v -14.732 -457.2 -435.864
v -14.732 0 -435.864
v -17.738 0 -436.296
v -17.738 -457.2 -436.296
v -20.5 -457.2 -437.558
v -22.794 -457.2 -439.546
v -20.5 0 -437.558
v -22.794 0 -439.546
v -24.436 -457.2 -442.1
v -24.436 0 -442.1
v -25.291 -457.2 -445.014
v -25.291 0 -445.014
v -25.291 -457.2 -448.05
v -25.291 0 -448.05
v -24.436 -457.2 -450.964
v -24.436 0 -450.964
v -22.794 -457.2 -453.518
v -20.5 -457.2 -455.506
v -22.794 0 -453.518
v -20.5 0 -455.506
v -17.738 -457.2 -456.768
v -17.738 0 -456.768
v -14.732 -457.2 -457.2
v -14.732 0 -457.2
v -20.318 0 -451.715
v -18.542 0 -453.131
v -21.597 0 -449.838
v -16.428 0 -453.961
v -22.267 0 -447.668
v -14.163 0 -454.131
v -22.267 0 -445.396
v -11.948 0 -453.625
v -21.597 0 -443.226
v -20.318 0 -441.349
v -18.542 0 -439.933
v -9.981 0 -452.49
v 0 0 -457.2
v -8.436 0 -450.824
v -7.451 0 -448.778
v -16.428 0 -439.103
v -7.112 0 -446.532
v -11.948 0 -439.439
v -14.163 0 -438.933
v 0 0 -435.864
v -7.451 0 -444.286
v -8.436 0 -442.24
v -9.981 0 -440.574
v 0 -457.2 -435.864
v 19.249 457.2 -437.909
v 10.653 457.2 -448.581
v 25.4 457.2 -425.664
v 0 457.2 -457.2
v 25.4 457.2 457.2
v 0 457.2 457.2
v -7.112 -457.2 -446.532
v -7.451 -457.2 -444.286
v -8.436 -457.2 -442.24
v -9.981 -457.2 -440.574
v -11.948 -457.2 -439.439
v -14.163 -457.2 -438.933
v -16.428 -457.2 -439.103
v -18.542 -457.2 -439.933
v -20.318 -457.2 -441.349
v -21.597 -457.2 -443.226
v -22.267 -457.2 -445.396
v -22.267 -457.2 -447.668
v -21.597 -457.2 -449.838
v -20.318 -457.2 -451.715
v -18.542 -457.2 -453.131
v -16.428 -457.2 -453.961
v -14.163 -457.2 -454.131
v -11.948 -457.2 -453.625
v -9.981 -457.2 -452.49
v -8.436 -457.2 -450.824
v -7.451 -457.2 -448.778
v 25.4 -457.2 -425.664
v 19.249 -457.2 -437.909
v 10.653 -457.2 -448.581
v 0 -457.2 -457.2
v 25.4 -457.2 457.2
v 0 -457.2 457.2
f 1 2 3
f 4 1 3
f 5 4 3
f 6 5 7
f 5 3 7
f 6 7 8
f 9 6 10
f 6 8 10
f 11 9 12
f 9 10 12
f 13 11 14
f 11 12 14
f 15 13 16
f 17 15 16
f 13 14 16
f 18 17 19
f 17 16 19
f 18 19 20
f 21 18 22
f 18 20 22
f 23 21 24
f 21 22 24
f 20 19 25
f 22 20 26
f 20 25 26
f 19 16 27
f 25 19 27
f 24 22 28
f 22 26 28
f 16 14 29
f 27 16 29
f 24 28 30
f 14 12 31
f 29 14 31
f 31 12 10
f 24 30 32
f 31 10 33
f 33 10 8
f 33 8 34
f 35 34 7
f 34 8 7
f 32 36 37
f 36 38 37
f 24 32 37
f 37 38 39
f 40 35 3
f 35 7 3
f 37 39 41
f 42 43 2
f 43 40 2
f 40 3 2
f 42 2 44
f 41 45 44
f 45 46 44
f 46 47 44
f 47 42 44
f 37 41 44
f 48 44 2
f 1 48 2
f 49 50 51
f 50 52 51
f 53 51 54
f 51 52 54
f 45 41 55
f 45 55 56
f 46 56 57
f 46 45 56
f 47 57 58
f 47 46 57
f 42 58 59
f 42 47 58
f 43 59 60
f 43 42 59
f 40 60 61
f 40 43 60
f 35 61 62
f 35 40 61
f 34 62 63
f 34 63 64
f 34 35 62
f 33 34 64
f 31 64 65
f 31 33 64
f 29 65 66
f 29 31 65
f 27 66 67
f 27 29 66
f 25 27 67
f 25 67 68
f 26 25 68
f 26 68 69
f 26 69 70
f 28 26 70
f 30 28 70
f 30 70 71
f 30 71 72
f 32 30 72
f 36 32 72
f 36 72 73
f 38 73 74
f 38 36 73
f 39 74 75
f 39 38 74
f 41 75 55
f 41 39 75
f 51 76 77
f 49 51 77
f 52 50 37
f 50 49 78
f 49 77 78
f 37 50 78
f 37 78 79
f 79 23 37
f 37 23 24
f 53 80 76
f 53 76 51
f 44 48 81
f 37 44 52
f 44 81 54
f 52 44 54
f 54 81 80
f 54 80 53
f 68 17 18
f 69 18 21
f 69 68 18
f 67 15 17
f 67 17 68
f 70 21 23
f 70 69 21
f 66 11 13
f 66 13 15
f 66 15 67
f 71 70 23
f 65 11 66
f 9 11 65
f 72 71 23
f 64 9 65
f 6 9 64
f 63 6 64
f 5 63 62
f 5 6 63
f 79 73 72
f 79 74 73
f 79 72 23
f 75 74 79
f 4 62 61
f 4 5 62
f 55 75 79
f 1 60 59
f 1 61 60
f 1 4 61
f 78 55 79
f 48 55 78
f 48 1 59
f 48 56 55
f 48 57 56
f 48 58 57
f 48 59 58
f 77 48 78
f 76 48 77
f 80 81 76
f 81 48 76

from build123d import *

# Parameters (mm, degrees)
F0_W     = 914.4
F0_H     = 914.4
F1_DEPTH = 25.4
F2_R     = 7.62
F3_DEPTH = 457.2
F5_DEPTH = 914.4


with BuildPart() as f1:
    # F0 (on Right) → F1 (new body)
    with BuildSketch(Plane.YZ):
        Rectangle(F0_W, F0_H)
    extrude(amount=F1_DEPTH)

    # F2 (on Front) → F3 (join, through all)
    with BuildSketch(Plane.XZ):
        with BuildLine():
            Line((0, -435.864), (-14.732, -435.864))
            ThreePointArc((-14.732, -435.864), (-25.4, -446.532), (-14.732, -457.2))
            Line((-14.732, -457.2), (0, -457.2))
            Line((0, -457.2), (0, -435.864))
        make_face()
        with Locations((-14.732, -446.532)):
            Circle(F2_R, mode=Mode.SUBTRACT)
    extrude(amount=F3_DEPTH)

    # F4 (on face) → F5 (cut, through all)
    with BuildSketch(Plane.XZ.offset(457.2)):
        with BuildLine():
            ThreePointArc((25.4, -425.6636202335), (15.2344848329, -443.4731324002), (0, -457.2))
            Line((0, -457.2), (25.4, -457.2))
            Line((25.4, -457.2), (25.4, -425.6636202335))
        make_face()
    extrude(amount=-F5_DEPTH, mode=Mode.SUBTRACT)


solid = f1.part
